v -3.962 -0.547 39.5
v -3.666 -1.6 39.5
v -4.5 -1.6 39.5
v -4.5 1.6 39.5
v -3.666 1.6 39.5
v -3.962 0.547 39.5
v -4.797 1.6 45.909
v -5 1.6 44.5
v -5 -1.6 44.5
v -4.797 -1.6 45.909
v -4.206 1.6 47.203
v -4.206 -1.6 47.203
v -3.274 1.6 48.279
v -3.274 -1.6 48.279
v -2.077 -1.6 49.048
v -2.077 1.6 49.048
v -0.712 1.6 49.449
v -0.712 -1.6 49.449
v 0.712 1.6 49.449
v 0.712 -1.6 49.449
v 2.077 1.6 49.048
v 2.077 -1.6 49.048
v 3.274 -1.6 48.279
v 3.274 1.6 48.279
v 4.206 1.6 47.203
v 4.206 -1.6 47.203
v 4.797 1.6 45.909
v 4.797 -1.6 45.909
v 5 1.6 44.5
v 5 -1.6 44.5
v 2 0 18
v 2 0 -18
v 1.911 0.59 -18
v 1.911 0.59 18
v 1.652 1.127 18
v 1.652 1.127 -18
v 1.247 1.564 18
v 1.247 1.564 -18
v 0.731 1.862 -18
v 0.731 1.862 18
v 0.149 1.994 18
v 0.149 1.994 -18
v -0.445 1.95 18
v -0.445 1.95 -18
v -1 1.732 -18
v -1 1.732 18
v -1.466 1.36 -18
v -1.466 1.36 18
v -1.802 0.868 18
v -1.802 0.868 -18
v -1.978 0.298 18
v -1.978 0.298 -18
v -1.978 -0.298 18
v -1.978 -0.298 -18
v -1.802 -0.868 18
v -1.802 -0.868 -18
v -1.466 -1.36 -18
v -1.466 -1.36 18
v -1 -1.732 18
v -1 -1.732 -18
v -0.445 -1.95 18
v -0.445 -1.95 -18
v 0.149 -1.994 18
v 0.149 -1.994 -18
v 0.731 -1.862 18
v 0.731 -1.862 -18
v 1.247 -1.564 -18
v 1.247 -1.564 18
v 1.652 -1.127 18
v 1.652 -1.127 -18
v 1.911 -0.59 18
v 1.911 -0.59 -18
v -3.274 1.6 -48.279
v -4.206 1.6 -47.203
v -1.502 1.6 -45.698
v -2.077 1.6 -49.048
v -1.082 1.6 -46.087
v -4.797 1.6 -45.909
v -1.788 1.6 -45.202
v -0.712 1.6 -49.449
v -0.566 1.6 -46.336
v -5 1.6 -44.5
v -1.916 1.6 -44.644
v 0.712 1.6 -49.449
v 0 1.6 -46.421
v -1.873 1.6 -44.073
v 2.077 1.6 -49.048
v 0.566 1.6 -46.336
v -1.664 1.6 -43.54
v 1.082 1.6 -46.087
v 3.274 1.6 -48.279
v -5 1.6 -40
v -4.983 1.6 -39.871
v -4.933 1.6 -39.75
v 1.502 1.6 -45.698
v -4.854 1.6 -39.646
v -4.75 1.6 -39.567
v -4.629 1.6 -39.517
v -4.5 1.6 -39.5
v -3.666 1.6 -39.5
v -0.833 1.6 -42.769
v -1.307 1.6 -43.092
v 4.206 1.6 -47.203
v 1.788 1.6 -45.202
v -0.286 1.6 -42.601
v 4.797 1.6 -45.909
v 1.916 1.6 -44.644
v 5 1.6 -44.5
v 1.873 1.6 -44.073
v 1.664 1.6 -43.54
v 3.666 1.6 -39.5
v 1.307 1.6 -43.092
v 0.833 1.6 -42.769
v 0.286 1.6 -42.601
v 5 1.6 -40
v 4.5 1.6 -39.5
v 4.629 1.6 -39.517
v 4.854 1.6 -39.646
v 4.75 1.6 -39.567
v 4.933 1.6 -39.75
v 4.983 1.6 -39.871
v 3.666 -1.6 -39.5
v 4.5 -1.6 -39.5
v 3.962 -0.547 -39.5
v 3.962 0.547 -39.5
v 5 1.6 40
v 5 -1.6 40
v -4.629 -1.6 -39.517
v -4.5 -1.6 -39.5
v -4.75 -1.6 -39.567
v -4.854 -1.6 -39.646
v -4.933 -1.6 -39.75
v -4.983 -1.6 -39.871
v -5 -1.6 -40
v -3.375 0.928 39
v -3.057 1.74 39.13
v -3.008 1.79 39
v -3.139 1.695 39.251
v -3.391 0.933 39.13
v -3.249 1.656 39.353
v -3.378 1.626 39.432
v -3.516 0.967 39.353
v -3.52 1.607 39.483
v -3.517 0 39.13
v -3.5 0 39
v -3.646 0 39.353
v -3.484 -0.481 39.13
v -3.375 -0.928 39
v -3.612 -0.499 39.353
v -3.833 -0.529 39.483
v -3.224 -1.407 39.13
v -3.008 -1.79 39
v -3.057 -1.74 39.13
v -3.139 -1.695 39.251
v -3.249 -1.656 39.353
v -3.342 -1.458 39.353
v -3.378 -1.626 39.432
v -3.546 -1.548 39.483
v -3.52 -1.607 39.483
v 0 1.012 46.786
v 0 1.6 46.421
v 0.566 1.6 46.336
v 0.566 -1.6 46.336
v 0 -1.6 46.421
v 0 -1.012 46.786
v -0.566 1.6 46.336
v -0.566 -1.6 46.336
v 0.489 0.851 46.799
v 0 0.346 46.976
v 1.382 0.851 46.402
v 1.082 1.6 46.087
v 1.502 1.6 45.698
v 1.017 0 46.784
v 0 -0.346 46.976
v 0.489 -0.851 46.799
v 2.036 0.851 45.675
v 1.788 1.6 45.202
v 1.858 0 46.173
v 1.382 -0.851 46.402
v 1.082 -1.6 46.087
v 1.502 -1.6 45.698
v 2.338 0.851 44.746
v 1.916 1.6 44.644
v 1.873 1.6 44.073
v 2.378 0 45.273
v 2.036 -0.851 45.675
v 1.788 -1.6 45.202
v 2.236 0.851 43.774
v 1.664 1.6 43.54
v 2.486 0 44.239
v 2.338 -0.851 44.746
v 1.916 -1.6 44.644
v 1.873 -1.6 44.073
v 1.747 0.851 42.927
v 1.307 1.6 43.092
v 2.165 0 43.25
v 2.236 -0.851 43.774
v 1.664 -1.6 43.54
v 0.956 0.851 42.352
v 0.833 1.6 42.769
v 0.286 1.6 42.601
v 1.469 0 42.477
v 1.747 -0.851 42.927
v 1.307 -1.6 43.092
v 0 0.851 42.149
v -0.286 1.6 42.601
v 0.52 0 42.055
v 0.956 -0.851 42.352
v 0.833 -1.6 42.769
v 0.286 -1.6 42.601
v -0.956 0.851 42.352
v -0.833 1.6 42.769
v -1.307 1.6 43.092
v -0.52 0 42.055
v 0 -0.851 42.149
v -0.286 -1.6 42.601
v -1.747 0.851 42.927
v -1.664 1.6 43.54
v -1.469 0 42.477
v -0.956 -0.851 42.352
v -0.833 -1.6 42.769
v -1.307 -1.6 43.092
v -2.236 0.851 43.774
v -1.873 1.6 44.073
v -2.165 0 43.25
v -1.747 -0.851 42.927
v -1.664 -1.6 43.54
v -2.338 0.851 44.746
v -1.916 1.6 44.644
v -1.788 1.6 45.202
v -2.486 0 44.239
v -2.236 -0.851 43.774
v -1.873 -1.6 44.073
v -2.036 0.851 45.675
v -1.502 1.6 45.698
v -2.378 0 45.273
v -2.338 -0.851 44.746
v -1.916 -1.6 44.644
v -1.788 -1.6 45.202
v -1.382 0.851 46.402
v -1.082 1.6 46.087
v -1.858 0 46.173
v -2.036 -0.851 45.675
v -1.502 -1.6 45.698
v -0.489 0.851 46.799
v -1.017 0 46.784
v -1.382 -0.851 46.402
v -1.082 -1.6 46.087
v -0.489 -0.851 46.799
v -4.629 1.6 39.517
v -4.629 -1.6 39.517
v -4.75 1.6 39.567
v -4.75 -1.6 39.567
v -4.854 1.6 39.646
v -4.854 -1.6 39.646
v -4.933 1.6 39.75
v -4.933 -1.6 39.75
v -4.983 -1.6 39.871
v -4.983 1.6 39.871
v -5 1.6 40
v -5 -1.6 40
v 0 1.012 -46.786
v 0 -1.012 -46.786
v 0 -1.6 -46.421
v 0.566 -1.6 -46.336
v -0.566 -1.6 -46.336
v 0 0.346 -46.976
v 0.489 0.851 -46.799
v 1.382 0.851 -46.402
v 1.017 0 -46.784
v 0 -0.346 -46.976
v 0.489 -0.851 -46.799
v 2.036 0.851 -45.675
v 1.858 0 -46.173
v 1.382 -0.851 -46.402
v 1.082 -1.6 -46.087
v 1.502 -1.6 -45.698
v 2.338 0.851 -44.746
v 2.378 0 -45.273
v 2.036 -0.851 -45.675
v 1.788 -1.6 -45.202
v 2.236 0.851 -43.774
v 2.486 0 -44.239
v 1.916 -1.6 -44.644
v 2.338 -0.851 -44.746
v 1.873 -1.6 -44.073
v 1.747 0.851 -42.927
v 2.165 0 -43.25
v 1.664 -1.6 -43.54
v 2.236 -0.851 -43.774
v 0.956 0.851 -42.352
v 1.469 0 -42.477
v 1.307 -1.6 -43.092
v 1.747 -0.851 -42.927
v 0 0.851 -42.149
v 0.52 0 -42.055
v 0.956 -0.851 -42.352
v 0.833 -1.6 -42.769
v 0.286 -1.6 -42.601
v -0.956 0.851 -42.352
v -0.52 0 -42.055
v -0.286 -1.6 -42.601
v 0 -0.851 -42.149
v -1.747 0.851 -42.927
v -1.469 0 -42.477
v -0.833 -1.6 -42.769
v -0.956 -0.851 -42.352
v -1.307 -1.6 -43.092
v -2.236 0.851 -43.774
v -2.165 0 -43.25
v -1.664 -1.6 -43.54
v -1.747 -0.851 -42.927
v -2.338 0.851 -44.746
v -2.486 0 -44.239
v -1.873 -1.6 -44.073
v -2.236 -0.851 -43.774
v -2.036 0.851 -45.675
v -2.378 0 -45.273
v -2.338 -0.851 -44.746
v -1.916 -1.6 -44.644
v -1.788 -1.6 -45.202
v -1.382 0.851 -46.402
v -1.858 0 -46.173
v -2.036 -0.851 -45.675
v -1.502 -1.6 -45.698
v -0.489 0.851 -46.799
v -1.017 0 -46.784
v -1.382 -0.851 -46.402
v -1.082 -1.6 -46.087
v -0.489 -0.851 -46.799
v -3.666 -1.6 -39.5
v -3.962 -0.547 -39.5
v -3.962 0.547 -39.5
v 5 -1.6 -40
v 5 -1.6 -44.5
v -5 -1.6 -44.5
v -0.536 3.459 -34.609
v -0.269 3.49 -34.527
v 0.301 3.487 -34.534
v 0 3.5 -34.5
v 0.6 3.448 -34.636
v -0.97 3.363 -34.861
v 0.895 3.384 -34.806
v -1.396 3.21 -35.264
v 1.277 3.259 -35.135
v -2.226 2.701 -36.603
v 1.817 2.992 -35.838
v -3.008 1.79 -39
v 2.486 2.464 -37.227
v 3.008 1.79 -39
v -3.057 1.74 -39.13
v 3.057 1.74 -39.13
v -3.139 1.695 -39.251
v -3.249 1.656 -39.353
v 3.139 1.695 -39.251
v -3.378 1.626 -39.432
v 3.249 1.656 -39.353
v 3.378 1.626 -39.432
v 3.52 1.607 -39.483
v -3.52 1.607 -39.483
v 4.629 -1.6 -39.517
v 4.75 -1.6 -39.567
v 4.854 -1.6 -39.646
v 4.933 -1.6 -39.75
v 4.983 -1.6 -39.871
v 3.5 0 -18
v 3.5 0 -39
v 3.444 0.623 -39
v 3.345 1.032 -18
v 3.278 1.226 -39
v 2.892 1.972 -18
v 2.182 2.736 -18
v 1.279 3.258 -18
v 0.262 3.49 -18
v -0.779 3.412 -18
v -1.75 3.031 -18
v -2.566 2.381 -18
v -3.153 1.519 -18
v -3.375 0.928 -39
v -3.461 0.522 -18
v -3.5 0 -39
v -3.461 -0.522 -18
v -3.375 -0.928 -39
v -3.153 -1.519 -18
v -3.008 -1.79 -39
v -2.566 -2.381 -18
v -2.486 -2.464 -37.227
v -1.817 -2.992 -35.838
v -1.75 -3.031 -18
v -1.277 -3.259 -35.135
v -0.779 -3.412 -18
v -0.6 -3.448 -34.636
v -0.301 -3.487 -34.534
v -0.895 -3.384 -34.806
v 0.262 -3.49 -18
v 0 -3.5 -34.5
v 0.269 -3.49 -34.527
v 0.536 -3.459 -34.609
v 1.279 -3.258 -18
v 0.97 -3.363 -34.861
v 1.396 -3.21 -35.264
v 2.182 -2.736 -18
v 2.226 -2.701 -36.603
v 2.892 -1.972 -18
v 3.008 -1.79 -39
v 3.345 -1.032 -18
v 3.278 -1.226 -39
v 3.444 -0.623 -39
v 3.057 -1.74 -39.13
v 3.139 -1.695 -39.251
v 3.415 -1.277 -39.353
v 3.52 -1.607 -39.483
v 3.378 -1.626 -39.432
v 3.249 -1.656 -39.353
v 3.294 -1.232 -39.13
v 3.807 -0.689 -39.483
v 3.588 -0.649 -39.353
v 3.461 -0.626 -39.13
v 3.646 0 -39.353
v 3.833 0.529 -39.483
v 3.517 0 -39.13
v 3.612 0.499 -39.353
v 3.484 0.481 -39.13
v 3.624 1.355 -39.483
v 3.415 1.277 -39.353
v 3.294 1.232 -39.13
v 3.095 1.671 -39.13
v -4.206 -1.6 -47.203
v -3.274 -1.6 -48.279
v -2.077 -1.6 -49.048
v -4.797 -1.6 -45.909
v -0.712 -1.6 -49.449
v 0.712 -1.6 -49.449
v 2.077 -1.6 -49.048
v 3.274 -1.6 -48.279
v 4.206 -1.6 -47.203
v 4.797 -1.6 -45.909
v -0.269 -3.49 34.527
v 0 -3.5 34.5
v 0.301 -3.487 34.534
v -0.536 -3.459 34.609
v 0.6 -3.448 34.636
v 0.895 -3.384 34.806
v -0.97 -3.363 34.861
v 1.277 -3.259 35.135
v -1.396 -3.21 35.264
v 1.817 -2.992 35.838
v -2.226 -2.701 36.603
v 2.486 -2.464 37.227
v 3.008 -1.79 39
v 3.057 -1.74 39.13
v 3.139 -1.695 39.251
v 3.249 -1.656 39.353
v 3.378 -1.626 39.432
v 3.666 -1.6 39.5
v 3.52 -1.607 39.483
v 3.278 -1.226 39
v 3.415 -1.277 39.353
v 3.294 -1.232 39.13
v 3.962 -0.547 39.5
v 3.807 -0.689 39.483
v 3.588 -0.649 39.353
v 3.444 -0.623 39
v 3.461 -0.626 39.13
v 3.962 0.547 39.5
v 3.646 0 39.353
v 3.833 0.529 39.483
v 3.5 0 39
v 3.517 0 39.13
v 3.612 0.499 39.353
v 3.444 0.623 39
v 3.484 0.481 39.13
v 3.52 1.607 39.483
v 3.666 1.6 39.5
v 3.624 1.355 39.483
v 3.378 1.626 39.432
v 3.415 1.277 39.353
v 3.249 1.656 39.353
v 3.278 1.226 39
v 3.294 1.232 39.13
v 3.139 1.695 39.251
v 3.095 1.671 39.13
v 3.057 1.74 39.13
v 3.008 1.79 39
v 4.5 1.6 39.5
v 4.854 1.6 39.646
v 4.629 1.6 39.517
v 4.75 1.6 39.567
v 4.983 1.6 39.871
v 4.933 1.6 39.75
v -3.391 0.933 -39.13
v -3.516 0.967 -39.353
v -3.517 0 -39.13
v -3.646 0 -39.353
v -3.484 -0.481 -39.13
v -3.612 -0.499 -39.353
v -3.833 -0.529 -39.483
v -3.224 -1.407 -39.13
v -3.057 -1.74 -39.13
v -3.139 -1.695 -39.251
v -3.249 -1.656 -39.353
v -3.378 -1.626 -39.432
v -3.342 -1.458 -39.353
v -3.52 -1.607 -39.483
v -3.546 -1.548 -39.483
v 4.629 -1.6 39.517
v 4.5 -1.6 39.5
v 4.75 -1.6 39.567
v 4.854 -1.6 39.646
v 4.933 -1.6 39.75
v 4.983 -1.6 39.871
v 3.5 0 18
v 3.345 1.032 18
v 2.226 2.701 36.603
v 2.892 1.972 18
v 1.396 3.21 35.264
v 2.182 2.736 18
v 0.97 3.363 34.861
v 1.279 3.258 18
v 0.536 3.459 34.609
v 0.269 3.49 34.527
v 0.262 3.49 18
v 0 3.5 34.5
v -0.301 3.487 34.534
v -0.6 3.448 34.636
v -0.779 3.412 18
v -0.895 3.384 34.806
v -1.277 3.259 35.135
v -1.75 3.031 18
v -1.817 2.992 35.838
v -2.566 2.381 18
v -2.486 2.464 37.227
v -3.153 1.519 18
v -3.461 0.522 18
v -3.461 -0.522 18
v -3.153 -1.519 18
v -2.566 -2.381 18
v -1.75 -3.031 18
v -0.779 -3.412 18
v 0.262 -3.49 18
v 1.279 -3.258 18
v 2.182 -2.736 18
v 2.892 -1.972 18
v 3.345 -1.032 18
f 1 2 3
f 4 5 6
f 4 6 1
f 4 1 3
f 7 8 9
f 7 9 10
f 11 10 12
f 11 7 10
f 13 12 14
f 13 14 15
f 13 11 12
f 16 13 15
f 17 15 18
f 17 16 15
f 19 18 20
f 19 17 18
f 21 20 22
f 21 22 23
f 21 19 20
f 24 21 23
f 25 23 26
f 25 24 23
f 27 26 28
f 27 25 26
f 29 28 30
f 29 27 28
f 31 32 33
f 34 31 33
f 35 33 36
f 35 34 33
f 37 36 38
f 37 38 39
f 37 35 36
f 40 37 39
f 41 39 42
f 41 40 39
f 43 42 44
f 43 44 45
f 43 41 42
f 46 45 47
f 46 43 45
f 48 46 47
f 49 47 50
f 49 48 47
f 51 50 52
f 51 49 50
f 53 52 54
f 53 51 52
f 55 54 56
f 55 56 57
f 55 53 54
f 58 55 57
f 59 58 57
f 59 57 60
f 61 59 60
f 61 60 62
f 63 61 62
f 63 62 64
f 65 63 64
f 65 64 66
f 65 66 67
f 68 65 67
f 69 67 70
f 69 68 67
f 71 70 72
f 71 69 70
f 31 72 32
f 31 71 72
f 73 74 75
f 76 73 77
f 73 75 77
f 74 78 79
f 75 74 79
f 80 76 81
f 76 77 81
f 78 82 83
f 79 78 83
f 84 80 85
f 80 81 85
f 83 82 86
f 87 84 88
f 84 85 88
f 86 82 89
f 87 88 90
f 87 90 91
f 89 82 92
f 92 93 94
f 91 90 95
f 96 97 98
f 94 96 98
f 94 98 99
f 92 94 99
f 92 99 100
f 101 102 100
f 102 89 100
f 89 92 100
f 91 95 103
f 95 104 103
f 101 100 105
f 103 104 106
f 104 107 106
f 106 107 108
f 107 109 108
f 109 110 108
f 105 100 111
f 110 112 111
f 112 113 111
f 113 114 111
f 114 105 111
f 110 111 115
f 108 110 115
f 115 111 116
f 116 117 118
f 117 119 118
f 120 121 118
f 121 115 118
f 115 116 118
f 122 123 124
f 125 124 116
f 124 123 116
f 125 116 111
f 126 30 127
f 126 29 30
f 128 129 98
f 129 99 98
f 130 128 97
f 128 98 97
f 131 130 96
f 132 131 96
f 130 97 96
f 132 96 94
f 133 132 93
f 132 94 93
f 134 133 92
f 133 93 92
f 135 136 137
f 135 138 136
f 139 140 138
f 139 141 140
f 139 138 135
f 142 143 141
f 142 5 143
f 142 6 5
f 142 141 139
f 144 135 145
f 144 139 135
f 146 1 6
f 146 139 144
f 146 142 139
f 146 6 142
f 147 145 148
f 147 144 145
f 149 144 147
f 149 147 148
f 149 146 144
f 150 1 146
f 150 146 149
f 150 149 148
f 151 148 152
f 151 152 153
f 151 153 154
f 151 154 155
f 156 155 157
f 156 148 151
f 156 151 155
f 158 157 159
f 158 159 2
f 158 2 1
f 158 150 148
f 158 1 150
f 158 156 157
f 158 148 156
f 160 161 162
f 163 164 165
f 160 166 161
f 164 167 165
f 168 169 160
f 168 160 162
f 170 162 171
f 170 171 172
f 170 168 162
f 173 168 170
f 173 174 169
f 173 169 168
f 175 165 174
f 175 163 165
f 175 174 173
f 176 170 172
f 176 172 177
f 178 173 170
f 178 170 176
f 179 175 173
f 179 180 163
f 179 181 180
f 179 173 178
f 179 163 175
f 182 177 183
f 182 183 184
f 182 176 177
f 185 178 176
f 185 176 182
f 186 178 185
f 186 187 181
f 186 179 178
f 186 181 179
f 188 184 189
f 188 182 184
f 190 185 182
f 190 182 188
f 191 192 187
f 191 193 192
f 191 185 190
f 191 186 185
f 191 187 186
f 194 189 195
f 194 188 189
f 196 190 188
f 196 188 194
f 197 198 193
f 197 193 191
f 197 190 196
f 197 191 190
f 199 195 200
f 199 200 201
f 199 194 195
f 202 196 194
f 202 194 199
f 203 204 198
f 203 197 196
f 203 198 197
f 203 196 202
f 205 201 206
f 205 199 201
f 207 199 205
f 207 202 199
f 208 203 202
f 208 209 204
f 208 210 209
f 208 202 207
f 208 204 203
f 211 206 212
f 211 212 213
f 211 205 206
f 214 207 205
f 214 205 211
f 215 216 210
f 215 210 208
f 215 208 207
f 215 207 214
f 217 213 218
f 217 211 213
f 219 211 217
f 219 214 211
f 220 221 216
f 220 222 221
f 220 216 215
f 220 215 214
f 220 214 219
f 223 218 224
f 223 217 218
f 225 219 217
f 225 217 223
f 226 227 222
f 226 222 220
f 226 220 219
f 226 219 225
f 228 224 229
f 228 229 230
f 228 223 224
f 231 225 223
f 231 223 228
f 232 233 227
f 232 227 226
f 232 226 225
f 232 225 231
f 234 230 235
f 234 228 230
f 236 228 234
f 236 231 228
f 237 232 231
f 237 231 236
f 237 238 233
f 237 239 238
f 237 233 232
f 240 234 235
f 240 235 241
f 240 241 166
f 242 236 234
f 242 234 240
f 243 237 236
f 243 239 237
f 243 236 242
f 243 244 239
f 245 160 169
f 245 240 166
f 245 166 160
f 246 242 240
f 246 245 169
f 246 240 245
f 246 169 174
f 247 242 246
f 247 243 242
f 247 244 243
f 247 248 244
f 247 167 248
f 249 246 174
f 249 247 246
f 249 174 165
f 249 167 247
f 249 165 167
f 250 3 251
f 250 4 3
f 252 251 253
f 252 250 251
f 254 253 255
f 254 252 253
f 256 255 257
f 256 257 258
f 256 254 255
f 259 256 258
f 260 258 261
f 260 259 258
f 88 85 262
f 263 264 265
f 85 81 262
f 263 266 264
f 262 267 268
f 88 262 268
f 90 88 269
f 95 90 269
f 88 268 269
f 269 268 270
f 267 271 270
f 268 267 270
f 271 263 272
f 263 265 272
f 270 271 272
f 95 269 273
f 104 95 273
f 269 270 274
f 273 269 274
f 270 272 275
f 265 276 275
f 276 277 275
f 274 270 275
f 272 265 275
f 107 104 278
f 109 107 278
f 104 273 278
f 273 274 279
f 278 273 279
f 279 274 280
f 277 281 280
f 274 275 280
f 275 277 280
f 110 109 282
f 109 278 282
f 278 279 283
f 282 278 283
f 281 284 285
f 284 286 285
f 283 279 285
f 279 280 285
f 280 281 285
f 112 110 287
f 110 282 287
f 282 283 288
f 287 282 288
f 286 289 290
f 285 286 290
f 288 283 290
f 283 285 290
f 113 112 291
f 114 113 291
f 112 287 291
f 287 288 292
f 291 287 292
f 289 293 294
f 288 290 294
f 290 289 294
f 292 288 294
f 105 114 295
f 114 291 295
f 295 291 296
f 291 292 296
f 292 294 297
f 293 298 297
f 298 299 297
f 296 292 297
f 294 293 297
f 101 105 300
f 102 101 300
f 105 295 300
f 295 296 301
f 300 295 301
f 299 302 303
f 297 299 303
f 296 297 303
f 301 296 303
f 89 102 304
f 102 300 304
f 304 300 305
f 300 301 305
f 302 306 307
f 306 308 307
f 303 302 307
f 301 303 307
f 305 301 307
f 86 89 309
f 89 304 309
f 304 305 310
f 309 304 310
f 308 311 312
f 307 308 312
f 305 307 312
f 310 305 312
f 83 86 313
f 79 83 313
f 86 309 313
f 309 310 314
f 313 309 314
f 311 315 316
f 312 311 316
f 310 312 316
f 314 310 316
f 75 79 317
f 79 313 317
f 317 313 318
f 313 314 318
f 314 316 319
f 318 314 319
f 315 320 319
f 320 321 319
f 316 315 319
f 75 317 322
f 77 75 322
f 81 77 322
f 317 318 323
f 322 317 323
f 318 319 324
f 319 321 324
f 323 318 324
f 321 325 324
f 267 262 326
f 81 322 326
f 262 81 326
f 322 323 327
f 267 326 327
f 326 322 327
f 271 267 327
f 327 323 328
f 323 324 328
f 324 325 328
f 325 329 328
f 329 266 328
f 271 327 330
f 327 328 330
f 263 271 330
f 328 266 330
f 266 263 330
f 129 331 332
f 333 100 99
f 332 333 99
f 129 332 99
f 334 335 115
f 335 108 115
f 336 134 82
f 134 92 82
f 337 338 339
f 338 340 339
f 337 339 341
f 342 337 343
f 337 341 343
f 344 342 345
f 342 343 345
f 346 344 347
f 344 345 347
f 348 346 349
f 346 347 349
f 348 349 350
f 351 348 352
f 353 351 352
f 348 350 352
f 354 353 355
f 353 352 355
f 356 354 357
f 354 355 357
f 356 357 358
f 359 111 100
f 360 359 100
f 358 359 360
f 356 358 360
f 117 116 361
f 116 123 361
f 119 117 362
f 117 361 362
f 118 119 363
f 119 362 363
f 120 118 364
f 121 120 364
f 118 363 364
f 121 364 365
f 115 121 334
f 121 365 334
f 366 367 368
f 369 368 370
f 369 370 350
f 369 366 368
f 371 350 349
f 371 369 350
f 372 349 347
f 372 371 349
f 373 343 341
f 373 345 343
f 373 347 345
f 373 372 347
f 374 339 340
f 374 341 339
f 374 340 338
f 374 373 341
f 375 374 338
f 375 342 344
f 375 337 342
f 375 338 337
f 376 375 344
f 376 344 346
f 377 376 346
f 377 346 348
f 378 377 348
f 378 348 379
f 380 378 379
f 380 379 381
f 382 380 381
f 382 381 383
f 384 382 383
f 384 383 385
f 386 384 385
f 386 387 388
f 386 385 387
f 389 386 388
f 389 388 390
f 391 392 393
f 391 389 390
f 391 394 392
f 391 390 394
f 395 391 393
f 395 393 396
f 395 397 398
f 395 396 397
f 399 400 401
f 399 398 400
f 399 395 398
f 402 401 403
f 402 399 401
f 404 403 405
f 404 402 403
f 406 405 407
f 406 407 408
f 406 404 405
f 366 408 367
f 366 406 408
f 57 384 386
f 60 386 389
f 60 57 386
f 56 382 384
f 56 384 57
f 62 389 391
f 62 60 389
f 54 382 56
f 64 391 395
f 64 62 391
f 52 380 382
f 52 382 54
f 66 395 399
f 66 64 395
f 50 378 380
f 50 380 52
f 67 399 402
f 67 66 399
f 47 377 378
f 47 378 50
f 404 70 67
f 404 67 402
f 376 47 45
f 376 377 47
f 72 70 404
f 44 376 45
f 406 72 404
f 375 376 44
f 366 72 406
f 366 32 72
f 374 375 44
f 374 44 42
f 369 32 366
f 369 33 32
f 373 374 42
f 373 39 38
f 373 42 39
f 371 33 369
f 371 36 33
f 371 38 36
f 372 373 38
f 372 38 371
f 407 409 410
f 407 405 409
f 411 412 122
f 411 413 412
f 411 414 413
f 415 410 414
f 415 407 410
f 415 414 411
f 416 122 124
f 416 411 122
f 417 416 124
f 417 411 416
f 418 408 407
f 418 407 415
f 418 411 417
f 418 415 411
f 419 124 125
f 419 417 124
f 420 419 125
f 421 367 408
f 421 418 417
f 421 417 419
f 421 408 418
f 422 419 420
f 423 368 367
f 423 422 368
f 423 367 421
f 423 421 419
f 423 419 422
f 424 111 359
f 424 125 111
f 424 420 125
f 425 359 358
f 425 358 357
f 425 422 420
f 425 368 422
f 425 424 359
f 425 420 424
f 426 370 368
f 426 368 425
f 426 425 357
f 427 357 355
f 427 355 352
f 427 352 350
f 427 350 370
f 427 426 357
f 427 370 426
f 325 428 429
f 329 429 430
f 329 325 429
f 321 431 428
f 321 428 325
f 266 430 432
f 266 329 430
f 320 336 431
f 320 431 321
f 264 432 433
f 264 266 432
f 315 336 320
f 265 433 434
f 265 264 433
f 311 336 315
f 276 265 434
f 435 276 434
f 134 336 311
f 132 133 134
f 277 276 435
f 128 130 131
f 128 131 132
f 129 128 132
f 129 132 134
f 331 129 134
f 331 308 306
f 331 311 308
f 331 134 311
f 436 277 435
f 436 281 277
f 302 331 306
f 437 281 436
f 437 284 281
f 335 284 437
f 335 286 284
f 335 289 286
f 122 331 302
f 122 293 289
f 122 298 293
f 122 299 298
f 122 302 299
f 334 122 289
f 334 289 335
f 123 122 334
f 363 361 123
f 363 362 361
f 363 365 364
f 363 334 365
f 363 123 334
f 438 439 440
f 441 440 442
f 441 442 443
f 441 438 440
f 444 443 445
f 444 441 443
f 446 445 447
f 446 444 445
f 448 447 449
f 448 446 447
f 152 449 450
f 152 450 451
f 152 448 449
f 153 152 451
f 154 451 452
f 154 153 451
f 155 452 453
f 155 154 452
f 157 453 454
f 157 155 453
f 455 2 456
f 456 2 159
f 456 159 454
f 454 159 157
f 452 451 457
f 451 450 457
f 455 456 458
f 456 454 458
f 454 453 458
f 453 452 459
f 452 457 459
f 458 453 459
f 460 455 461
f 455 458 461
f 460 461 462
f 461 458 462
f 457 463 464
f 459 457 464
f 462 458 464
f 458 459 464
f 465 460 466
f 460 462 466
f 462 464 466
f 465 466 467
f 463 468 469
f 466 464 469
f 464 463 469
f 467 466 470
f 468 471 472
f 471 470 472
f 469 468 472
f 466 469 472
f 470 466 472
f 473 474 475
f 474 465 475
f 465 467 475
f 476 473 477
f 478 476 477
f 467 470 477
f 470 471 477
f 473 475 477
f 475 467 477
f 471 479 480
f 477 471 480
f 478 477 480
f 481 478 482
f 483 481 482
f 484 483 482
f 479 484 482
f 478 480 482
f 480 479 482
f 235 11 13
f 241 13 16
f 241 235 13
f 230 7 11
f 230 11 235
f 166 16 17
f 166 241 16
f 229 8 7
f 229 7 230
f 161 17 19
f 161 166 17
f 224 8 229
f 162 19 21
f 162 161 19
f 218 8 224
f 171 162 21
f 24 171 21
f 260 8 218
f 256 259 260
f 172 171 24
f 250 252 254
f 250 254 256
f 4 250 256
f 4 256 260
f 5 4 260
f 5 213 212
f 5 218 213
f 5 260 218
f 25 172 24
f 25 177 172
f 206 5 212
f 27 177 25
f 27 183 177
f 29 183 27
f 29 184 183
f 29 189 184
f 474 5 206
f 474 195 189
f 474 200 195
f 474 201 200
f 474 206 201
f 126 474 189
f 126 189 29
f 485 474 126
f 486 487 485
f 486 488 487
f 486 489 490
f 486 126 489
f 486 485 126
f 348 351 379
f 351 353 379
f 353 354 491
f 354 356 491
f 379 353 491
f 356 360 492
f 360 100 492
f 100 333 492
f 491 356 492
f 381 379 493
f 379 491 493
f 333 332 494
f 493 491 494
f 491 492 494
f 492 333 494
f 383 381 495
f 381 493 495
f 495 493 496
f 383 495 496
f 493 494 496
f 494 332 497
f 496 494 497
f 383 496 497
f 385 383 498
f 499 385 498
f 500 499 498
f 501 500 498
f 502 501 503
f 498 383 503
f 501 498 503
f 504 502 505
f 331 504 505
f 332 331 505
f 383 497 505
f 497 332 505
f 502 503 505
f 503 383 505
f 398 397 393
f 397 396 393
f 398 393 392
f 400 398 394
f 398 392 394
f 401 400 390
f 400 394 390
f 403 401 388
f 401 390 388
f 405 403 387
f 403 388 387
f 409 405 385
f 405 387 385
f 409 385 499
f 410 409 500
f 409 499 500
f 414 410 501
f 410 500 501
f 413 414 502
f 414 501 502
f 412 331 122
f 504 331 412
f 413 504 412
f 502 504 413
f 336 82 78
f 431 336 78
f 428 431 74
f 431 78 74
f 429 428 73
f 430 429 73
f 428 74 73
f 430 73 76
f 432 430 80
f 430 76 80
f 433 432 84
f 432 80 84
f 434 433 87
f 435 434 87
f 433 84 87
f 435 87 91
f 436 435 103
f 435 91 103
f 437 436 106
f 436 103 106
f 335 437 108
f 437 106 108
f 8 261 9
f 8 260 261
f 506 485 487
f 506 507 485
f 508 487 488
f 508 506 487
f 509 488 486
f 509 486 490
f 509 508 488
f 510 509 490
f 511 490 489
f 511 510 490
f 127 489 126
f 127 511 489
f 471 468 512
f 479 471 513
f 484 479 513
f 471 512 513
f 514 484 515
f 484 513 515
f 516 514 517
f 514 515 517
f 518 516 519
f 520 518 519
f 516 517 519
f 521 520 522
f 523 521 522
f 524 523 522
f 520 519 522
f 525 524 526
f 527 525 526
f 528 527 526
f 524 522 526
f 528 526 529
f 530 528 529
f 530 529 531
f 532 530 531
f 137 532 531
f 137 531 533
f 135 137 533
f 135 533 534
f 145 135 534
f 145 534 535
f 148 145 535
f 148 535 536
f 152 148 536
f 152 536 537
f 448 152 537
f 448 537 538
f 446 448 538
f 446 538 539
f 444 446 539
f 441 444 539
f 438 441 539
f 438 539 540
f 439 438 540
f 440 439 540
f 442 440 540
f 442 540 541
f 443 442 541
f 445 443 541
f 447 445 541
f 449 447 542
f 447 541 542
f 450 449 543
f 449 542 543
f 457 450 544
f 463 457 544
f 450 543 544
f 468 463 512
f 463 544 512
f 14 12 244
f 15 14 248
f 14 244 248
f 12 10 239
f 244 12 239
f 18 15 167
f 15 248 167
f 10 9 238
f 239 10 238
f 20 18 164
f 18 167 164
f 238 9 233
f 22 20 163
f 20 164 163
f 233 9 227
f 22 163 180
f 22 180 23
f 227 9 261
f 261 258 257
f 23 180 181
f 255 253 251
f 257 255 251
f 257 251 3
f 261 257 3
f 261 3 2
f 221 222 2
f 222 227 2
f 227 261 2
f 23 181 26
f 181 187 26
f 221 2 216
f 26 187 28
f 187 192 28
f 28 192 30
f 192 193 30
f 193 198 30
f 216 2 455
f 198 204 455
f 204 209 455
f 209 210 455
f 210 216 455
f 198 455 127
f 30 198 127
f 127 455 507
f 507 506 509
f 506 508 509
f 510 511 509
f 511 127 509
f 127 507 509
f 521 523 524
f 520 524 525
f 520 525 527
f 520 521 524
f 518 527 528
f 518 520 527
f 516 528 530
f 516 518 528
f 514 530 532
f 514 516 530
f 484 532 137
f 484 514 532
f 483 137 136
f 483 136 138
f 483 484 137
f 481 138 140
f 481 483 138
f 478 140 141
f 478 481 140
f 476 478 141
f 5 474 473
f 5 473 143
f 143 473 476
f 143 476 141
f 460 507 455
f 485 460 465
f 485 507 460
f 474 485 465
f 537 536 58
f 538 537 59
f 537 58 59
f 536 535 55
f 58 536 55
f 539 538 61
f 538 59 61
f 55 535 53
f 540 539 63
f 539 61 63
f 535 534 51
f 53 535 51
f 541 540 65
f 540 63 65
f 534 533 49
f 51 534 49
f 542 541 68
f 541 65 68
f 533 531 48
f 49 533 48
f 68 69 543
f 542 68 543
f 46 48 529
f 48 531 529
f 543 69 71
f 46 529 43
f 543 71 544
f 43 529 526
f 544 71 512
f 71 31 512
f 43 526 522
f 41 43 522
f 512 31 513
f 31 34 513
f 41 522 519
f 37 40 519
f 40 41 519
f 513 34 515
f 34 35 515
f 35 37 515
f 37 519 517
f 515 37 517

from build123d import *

# Parameters (mm, degrees)
SKETCH1_R                  = 2
SCREW_SECTION_DEPTH        = 18
SKETCH2_R                  = 3.5
BAR_SECTION_DEPTH          = 21.5
MOUNT_SECTION_DEPTH        = 1.6
BAR_TAPER_DEPTH            = 6
MOUNT_FILLET_R             = 0.5
MOUNT_FILLET_OF_MIRROR_2_R = 0.5


with BuildPart() as part:
    # Sketch1 → Screw Section (new body)
    with BuildSketch(Plane.XY):
        Circle(SKETCH1_R)
    screw_section = extrude(amount=SCREW_SECTION_DEPTH)

    # Sketch2 → Bar Section (add)
    with BuildSketch(Plane.XY.offset(18)):
        Circle(SKETCH2_R)
    bar_section = extrude(amount=BAR_SECTION_DEPTH)

    # Sketch3 → Mount Section (add, symmetric)
    with BuildSketch(Plane(origin=(0, 0, 0), x_dir=(1, 0, 0), z_dir=(0, 1, 0))):
        with BuildLine():
            Line((5, -39.5), (-5, -39.5))
            Line((-5, -39.5), (-5, -44.5))
            ThreePointArc((-5, -44.5), (0, -49.5), (5, -44.5))
            Line((5, -44.5), (5, -39.5))
        make_face()
    mount_section = extrude(amount=MOUNT_SECTION_DEPTH, both=True)

    # Sketch4 → Bar Taper (cut, symmetric)
    with BuildSketch(Plane(origin=(0, 0, 0), x_dir=(0, 0, -1), z_dir=(1, 0, 0))):
        Polygon((-34.5, -3.5), (-39.5, -1.6), (-39.5, -3.5), align=None)
        Polygon((-34.5, 3.5), (-39.5, 1.6), (-39.5, 3.5), align=None)
    bar_taper = extrude(amount=BAR_TAPER_DEPTH, both=True, mode=Mode.SUBTRACT)

    # Mount Fillet
    mount_fillet_edges = [part.edges().sort_by_distance(p)[0] for p in [
        (-5, 0, 39.5),
        (3.401842713, -0.823083322, 39.5),
        (-3.5, 0, 39.5),
        (5, 0, 39.5),
    ]]
    fillet(mount_fillet_edges, radius=MOUNT_FILLET_R)

    # Sketch6 → Ball Hole (revolve, cut)
    with BuildSketch(Plane(origin=(0, 0, 0), x_dir=(0, 0, -1), z_dir=(1, 0, 0))):
        with BuildLine():
            Line((-46.420937271, -1.6), (-44.5, -1.6))
            Line((-44.5, -1.6), (-44.5, 1.6))
            Line((-44.5, 1.6), (-46.420937271, 1.6))
            ThreePointArc((-46.420937271, 1.6), (-47, 0), (-46.420937271, -1.6))
        make_face()
    ball_hole = revolve(axis=Axis((0, -1.6, 44.5), (0, 1, 0)), mode=Mode.SUBTRACT)

    # Mirror 2: Screw Section, Bar Section, Mount Section, Bar Taper, Ball Hole across Front Plane
    add(screw_section.mirror(Plane.XY))
    add(bar_section.mirror(Plane.XY))
    add(mount_section.mirror(Plane.XY))
    add(bar_taper.mirror(Plane.XY), mode=Mode.SUBTRACT)
    add(ball_hole.mirror(Plane.XY), mode=Mode.SUBTRACT)

    # Mount Fillet of Mirror 2
    mount_fillet_of_mirror_2_edges = [part.edges().sort_by_distance(p)[0] for p in [
        (-5, 0, -39.5),
        (3.401842713, -0.823083322, -39.5),
        (-3.5, 0, -39.5),
        (5, 0, -39.5),
    ]]
    fillet(mount_fillet_of_mirror_2_edges, radius=MOUNT_FILLET_OF_MIRROR_2_R)


solid = part.part
